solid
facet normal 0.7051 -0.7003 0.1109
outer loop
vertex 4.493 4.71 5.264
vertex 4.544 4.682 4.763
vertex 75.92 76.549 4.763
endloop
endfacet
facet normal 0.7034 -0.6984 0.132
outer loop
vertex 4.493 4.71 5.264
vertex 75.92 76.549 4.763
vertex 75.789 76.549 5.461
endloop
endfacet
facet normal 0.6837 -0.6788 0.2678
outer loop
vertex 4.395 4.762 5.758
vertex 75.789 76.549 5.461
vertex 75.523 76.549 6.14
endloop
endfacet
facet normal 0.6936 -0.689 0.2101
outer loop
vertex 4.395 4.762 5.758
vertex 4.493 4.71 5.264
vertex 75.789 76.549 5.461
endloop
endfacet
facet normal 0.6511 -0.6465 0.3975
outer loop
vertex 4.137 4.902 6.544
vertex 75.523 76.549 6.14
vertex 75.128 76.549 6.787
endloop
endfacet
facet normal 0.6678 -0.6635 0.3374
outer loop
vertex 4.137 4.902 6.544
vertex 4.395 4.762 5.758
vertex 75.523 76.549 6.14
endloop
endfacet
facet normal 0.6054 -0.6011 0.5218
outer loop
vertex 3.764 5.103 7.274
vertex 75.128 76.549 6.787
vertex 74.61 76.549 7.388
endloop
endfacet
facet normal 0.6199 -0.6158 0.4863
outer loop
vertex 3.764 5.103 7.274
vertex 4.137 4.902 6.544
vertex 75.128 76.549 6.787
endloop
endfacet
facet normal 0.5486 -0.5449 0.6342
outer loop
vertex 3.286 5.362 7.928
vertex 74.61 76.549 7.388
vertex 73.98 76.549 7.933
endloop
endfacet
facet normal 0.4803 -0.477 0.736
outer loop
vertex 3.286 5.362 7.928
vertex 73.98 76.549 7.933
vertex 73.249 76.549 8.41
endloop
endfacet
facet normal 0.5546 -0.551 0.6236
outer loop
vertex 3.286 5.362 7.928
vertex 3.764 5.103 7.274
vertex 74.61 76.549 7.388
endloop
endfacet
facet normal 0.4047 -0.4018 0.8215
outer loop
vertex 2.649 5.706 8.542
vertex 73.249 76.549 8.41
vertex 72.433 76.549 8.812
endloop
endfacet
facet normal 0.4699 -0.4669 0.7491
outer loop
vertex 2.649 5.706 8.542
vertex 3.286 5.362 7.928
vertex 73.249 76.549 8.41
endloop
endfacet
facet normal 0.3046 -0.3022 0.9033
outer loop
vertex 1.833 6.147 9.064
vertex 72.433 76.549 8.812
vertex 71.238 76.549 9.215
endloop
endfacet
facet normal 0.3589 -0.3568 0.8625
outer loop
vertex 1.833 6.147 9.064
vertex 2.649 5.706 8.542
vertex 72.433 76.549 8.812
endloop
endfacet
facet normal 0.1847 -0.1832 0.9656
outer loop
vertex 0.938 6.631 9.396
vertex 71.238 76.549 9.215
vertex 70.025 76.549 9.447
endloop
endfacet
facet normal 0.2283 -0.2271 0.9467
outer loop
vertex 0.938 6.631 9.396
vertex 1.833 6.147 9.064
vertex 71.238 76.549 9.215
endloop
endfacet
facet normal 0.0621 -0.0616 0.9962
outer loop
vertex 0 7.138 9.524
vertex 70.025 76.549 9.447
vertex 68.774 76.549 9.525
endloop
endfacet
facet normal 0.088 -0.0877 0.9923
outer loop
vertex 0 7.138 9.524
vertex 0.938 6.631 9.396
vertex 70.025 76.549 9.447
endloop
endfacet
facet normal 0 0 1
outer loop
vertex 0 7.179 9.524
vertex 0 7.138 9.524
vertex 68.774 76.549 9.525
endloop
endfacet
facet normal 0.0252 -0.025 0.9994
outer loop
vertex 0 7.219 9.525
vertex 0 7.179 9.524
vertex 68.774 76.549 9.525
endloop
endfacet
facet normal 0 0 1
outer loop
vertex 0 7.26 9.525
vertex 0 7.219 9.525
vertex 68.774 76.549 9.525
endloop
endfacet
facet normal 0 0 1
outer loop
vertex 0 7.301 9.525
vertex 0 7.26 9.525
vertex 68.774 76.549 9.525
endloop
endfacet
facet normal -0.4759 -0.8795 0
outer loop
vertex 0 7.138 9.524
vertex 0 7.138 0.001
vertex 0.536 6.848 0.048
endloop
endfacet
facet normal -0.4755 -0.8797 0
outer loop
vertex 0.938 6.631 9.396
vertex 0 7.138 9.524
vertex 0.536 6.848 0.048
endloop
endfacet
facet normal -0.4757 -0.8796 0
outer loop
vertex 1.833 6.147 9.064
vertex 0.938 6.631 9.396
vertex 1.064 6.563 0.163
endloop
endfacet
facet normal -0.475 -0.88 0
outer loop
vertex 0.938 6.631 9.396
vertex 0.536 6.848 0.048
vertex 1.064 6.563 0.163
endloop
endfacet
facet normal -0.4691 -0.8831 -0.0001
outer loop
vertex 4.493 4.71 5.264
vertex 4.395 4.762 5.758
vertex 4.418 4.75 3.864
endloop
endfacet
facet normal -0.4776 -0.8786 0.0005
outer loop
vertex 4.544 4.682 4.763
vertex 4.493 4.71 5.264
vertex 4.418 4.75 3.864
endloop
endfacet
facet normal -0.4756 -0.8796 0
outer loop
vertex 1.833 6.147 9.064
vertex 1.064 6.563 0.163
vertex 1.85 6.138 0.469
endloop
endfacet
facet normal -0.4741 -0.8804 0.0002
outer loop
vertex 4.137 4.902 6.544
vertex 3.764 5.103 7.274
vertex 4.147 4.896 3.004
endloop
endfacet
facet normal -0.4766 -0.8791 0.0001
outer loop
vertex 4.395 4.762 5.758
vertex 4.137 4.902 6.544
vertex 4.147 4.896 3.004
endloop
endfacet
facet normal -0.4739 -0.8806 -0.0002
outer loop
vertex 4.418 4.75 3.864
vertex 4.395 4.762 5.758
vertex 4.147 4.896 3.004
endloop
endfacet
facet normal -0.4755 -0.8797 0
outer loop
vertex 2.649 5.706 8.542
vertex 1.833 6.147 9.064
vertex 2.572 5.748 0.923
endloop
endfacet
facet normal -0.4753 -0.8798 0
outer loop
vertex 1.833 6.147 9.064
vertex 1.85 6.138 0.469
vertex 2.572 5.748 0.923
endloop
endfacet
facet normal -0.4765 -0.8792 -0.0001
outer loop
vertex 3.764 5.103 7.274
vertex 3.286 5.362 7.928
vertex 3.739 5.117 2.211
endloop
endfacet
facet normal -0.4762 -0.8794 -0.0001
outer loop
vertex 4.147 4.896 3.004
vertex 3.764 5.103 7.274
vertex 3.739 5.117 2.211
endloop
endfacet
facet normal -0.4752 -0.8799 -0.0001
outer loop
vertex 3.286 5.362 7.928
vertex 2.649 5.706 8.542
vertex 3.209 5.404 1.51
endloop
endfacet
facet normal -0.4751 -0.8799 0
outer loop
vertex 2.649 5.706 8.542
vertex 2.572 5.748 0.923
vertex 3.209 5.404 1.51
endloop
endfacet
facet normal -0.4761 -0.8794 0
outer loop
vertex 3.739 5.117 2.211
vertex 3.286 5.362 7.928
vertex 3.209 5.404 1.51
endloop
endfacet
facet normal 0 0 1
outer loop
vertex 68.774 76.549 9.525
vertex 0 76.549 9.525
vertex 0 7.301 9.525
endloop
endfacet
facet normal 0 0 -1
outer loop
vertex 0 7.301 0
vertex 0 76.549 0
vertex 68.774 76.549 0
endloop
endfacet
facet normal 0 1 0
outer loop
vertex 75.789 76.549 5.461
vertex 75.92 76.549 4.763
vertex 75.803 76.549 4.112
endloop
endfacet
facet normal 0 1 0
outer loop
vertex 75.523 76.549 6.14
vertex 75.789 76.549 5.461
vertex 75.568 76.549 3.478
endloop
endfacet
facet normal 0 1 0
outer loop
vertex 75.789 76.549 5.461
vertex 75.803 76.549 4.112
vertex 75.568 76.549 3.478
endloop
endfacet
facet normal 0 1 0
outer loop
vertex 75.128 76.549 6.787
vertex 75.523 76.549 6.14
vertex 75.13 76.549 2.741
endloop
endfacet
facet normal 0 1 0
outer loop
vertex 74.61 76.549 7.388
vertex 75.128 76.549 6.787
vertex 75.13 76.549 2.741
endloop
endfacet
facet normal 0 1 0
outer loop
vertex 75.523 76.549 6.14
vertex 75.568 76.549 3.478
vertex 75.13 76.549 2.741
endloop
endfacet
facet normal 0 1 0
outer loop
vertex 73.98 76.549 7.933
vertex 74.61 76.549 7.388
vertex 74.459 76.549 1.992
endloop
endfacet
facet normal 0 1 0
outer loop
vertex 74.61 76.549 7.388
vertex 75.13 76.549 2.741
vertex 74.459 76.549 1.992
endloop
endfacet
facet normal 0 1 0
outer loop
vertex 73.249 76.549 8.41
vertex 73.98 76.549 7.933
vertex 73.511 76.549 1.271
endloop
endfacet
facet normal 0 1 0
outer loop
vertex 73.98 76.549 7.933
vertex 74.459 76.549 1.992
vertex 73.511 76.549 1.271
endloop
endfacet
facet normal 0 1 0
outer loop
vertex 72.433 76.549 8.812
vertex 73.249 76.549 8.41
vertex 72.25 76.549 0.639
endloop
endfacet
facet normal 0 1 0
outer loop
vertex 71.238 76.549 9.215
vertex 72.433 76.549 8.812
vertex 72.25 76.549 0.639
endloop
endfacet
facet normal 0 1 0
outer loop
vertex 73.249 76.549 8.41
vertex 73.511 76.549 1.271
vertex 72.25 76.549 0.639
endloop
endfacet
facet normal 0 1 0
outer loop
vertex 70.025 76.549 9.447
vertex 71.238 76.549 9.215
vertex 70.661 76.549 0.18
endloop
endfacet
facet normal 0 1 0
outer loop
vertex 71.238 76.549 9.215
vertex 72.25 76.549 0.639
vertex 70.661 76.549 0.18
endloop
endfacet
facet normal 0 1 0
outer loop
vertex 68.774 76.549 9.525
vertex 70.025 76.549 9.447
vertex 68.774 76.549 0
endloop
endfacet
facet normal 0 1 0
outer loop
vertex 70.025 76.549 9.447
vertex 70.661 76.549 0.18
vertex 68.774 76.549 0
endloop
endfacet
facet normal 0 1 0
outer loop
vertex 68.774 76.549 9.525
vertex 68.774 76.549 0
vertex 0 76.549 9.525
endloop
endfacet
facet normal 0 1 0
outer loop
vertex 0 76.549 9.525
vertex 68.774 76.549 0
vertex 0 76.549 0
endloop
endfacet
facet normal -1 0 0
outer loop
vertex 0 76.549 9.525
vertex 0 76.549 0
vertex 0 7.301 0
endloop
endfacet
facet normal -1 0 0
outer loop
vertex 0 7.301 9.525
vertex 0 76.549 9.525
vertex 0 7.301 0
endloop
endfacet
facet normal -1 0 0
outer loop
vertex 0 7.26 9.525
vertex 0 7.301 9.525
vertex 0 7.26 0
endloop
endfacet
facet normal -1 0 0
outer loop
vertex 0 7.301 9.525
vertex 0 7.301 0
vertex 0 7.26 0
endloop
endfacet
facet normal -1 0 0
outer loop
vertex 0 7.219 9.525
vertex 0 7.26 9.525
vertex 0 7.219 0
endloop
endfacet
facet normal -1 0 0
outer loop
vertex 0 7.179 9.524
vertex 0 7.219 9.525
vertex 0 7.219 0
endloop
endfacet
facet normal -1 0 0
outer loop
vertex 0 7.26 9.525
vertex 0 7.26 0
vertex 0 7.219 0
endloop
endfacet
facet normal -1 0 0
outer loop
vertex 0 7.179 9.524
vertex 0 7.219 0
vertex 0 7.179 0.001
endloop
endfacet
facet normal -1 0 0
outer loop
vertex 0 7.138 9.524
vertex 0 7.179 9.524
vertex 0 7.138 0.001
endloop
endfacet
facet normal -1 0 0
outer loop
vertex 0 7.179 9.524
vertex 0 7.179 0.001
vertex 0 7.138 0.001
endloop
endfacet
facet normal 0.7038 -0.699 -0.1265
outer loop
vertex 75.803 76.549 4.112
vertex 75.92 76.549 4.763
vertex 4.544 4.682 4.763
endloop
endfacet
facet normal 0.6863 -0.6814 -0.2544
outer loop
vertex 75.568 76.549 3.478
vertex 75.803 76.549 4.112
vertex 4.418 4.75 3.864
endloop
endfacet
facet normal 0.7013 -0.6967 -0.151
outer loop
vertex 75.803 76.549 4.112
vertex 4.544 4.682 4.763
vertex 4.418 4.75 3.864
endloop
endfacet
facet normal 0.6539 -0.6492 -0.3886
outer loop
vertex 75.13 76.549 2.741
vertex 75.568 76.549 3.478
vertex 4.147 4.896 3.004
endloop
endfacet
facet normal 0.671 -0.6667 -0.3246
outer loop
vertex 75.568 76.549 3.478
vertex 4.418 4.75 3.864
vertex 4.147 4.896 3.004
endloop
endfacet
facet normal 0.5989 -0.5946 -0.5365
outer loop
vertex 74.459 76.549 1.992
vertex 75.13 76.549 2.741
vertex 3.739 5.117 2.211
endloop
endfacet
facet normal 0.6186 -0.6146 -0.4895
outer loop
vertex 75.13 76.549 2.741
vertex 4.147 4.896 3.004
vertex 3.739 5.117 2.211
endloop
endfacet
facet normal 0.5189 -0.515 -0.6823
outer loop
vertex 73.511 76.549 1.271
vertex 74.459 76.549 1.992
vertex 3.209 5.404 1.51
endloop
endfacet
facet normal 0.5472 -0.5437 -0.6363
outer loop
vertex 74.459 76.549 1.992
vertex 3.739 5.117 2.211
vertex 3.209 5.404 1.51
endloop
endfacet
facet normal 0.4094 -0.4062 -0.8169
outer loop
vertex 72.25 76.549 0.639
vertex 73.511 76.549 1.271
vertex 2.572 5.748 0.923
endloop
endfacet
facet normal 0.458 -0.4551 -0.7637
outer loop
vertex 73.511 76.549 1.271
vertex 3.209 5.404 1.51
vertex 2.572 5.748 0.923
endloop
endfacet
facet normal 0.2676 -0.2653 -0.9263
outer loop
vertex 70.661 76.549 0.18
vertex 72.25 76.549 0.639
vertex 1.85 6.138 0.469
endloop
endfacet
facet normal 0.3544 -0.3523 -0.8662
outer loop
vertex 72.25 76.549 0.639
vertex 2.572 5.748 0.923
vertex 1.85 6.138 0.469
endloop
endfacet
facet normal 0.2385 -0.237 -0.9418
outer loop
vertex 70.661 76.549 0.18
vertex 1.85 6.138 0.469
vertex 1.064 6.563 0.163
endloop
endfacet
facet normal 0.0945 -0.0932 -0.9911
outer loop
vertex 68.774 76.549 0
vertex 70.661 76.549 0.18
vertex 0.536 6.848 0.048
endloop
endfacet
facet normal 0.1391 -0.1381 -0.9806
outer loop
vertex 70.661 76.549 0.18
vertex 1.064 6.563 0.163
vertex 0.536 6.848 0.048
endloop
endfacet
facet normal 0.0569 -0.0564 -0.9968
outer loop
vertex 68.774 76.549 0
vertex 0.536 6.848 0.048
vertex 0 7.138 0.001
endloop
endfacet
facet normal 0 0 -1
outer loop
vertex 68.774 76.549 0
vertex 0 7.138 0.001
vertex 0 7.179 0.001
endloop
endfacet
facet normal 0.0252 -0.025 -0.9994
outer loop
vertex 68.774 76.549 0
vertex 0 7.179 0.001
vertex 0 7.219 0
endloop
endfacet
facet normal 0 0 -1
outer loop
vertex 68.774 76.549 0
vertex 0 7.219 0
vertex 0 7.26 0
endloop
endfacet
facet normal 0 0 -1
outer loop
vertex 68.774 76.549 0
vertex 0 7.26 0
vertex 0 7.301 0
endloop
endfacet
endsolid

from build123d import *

# Parameters (mm, degrees)
F1_DEPTH    = 9.525
F2_T1_DEPTH = 126.6954628883


# Not quite as in the source:
# - a fillet or chamfer that OpenCascade refuses, or shapes differently, is made with other operations: its cross-section is extruded or revolved along the edge and cut away or added


with BuildPart() as f1:
    # F0 (on Top) → F1 (new body)
    with BuildSketch(Plane.XY):
        Polygon((0, 76.5490606427), (0, 7.1380194277), (4.5535564423, 4.6766349114), (75.9337022901, 76.5490606427), align=None)
    extrude(amount=F1_DEPTH)

    # F2: fillet of radius 5.08 on 2 edges, made by hand

    # F2_s2 → F2_t1 (cut)
    with BuildSketch(Plane(origin=(-4.3499505247, -4.3799503673, 0), x_dir=(0, 0, 1), z_dir=(0.7046726854, 0.7095325267, 0))):
        with BuildLine():
            ThreePointArc((5.08, -0.0646004733), (1.4878975516, -1.5524980249), (0, -5.1446004733))
            Line((0, -5.1446004733), (0, -0.0646004733))
            Line((0, -0.0646004733), (5.08, -0.0646004733))
        make_face()
        with BuildLine():
            ThreePointArc((4.445, -0.0646004733), (8.0371024484, -1.5524980249), (9.525, -5.1446004733))
            Line((9.525, -5.1446004733), (9.525, -0.0646004733))
            Line((9.525, -0.0646004733), (4.445, -0.0646004733))
        make_face()
    extrude(amount=F2_T1_DEPTH, mode=Mode.SUBTRACT)


solid = f1.part
